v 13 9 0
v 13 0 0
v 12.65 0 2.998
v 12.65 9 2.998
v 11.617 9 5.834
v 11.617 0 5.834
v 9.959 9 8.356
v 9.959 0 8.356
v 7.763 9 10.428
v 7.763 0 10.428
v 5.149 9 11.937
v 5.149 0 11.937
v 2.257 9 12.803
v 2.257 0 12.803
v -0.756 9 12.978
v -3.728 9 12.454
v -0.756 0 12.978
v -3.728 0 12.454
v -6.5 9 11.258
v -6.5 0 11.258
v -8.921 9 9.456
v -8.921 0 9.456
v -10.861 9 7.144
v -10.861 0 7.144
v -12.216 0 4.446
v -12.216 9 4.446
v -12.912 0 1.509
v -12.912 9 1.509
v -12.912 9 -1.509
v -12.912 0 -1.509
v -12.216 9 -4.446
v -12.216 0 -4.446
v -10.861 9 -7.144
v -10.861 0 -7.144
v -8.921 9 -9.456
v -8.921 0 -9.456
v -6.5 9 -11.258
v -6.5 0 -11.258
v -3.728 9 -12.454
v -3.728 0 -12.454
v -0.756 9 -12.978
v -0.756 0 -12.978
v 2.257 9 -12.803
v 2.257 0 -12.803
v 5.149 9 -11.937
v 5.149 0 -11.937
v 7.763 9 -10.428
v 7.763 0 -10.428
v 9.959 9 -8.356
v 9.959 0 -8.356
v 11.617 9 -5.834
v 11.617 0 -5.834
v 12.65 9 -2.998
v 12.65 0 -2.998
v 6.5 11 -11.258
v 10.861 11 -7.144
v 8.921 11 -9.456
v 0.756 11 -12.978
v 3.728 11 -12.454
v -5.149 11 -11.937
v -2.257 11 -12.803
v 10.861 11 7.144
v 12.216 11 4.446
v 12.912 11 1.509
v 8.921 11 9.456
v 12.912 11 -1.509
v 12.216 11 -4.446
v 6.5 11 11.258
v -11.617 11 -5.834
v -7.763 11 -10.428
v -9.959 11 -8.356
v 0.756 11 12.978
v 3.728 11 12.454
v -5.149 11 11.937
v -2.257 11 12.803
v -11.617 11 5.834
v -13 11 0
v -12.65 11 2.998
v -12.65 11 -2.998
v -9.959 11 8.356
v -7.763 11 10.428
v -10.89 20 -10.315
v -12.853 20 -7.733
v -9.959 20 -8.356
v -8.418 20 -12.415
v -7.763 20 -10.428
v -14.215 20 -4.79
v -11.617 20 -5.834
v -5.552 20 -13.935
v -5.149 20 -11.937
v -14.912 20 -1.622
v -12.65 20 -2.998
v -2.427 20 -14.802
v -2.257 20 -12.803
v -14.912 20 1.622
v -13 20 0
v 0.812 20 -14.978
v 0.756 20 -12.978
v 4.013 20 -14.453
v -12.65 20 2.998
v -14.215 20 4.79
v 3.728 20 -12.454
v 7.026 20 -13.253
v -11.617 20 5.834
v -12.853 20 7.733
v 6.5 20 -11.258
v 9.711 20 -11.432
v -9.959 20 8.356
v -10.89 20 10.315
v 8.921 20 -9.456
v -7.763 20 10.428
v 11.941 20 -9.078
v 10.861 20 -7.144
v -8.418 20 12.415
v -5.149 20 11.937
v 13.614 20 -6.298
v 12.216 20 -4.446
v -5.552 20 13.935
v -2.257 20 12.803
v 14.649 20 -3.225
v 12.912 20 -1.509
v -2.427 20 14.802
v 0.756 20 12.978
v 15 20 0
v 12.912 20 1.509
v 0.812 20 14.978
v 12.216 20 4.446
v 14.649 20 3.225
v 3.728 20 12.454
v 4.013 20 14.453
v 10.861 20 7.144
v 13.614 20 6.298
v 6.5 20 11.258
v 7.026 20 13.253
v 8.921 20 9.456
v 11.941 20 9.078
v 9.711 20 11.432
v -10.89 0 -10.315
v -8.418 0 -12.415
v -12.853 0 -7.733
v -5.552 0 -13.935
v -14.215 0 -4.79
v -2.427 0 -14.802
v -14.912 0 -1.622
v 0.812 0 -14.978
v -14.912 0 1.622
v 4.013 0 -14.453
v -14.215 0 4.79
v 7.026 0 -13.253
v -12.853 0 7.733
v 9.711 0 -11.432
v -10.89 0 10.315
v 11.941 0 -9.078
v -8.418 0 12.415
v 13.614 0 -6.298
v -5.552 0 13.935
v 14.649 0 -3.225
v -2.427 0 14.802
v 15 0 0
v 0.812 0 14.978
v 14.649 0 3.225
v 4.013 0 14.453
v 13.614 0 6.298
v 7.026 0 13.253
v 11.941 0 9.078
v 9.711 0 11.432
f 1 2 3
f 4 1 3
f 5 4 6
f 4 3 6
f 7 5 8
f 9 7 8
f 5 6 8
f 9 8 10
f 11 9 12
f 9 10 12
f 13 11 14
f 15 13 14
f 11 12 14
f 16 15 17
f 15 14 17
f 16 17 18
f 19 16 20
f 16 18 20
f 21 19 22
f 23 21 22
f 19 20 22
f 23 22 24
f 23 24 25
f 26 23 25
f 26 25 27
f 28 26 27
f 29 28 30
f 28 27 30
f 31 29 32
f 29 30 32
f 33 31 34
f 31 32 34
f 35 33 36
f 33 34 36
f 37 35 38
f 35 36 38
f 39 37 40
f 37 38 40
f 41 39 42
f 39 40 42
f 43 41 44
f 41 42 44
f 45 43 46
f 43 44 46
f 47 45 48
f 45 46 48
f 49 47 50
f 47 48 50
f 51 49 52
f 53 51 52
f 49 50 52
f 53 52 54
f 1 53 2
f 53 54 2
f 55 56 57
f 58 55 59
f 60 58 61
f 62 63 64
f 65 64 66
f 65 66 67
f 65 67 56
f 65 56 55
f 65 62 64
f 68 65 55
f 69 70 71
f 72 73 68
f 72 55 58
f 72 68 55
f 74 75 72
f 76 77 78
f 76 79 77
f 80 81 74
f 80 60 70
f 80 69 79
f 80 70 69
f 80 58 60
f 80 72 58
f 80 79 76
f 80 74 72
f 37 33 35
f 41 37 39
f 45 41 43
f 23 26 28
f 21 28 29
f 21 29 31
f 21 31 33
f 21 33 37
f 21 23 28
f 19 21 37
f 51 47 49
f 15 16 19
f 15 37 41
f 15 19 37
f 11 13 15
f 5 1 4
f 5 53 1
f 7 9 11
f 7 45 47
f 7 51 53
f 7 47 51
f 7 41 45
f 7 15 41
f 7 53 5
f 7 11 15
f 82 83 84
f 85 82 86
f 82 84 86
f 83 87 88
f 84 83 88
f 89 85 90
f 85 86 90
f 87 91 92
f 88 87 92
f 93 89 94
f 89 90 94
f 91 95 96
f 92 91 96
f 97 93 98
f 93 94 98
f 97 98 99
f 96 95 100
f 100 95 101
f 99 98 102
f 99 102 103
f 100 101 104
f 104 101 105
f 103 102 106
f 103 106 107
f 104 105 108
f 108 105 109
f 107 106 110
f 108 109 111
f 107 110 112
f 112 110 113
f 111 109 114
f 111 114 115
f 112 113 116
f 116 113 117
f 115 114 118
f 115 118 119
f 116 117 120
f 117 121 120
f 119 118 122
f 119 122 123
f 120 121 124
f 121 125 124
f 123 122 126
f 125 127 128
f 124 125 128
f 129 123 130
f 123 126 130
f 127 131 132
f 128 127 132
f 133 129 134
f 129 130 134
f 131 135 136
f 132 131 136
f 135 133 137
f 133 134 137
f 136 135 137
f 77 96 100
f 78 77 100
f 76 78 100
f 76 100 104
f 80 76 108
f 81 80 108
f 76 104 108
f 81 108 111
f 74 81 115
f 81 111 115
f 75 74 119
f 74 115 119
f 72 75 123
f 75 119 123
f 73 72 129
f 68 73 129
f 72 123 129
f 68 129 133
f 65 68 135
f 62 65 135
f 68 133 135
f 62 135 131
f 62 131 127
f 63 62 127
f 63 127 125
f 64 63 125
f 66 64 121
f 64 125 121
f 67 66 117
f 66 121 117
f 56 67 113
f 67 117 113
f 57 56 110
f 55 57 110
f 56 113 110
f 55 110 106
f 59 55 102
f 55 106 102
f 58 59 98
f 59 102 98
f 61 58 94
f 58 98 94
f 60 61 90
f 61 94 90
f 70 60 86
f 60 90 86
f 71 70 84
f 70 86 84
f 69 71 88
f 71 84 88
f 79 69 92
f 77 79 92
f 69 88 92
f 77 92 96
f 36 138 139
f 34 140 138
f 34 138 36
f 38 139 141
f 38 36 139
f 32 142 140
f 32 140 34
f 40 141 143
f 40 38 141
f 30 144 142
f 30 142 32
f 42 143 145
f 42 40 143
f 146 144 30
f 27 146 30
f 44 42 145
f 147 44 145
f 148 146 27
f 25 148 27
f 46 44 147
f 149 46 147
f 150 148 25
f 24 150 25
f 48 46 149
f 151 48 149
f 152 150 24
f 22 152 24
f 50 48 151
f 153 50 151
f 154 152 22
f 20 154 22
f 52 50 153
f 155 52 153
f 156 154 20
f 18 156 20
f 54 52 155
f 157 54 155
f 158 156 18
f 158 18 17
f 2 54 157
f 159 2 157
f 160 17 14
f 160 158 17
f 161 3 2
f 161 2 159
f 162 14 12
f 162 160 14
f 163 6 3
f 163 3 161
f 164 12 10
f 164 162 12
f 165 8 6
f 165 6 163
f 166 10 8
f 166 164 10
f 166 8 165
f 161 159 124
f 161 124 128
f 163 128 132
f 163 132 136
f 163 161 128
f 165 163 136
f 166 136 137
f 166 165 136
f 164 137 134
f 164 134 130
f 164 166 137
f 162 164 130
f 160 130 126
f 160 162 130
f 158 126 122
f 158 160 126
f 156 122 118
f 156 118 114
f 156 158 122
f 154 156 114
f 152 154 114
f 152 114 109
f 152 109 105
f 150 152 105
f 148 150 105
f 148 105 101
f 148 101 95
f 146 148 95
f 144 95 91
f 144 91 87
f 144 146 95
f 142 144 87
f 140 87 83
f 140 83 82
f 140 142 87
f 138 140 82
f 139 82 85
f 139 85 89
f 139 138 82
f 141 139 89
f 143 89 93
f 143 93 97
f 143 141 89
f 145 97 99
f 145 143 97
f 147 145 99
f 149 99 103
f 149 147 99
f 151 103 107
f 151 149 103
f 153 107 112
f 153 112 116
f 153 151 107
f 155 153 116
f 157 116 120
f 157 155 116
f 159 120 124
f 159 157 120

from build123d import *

# Parameters (mm, degrees)
F0_R     = 15
F1_DEPTH = 20
F2_R     = 13
F3_DEPTH = 9
F4_R     = 13
F5_DEPTH = 9


with BuildPart() as f1:
    # F0 (on Front) → F1 (new body)
    with BuildSketch(Plane.XZ):
        Circle(F0_R)
    extrude(amount=-F1_DEPTH)

    # F2 (on face) → F3 (cut)
    with BuildSketch(Plane.XZ):
        Circle(F2_R)
    extrude(amount=-F3_DEPTH, mode=Mode.SUBTRACT)

    # F4 (on face) → F5 (cut)
    with BuildSketch(Plane(origin=(0, 20, 0), x_dir=(-1, 0, 0), z_dir=(0, 1, 0))):
        Circle(F4_R)
    extrude(amount=-F5_DEPTH, mode=Mode.SUBTRACT)


solid = f1.part
